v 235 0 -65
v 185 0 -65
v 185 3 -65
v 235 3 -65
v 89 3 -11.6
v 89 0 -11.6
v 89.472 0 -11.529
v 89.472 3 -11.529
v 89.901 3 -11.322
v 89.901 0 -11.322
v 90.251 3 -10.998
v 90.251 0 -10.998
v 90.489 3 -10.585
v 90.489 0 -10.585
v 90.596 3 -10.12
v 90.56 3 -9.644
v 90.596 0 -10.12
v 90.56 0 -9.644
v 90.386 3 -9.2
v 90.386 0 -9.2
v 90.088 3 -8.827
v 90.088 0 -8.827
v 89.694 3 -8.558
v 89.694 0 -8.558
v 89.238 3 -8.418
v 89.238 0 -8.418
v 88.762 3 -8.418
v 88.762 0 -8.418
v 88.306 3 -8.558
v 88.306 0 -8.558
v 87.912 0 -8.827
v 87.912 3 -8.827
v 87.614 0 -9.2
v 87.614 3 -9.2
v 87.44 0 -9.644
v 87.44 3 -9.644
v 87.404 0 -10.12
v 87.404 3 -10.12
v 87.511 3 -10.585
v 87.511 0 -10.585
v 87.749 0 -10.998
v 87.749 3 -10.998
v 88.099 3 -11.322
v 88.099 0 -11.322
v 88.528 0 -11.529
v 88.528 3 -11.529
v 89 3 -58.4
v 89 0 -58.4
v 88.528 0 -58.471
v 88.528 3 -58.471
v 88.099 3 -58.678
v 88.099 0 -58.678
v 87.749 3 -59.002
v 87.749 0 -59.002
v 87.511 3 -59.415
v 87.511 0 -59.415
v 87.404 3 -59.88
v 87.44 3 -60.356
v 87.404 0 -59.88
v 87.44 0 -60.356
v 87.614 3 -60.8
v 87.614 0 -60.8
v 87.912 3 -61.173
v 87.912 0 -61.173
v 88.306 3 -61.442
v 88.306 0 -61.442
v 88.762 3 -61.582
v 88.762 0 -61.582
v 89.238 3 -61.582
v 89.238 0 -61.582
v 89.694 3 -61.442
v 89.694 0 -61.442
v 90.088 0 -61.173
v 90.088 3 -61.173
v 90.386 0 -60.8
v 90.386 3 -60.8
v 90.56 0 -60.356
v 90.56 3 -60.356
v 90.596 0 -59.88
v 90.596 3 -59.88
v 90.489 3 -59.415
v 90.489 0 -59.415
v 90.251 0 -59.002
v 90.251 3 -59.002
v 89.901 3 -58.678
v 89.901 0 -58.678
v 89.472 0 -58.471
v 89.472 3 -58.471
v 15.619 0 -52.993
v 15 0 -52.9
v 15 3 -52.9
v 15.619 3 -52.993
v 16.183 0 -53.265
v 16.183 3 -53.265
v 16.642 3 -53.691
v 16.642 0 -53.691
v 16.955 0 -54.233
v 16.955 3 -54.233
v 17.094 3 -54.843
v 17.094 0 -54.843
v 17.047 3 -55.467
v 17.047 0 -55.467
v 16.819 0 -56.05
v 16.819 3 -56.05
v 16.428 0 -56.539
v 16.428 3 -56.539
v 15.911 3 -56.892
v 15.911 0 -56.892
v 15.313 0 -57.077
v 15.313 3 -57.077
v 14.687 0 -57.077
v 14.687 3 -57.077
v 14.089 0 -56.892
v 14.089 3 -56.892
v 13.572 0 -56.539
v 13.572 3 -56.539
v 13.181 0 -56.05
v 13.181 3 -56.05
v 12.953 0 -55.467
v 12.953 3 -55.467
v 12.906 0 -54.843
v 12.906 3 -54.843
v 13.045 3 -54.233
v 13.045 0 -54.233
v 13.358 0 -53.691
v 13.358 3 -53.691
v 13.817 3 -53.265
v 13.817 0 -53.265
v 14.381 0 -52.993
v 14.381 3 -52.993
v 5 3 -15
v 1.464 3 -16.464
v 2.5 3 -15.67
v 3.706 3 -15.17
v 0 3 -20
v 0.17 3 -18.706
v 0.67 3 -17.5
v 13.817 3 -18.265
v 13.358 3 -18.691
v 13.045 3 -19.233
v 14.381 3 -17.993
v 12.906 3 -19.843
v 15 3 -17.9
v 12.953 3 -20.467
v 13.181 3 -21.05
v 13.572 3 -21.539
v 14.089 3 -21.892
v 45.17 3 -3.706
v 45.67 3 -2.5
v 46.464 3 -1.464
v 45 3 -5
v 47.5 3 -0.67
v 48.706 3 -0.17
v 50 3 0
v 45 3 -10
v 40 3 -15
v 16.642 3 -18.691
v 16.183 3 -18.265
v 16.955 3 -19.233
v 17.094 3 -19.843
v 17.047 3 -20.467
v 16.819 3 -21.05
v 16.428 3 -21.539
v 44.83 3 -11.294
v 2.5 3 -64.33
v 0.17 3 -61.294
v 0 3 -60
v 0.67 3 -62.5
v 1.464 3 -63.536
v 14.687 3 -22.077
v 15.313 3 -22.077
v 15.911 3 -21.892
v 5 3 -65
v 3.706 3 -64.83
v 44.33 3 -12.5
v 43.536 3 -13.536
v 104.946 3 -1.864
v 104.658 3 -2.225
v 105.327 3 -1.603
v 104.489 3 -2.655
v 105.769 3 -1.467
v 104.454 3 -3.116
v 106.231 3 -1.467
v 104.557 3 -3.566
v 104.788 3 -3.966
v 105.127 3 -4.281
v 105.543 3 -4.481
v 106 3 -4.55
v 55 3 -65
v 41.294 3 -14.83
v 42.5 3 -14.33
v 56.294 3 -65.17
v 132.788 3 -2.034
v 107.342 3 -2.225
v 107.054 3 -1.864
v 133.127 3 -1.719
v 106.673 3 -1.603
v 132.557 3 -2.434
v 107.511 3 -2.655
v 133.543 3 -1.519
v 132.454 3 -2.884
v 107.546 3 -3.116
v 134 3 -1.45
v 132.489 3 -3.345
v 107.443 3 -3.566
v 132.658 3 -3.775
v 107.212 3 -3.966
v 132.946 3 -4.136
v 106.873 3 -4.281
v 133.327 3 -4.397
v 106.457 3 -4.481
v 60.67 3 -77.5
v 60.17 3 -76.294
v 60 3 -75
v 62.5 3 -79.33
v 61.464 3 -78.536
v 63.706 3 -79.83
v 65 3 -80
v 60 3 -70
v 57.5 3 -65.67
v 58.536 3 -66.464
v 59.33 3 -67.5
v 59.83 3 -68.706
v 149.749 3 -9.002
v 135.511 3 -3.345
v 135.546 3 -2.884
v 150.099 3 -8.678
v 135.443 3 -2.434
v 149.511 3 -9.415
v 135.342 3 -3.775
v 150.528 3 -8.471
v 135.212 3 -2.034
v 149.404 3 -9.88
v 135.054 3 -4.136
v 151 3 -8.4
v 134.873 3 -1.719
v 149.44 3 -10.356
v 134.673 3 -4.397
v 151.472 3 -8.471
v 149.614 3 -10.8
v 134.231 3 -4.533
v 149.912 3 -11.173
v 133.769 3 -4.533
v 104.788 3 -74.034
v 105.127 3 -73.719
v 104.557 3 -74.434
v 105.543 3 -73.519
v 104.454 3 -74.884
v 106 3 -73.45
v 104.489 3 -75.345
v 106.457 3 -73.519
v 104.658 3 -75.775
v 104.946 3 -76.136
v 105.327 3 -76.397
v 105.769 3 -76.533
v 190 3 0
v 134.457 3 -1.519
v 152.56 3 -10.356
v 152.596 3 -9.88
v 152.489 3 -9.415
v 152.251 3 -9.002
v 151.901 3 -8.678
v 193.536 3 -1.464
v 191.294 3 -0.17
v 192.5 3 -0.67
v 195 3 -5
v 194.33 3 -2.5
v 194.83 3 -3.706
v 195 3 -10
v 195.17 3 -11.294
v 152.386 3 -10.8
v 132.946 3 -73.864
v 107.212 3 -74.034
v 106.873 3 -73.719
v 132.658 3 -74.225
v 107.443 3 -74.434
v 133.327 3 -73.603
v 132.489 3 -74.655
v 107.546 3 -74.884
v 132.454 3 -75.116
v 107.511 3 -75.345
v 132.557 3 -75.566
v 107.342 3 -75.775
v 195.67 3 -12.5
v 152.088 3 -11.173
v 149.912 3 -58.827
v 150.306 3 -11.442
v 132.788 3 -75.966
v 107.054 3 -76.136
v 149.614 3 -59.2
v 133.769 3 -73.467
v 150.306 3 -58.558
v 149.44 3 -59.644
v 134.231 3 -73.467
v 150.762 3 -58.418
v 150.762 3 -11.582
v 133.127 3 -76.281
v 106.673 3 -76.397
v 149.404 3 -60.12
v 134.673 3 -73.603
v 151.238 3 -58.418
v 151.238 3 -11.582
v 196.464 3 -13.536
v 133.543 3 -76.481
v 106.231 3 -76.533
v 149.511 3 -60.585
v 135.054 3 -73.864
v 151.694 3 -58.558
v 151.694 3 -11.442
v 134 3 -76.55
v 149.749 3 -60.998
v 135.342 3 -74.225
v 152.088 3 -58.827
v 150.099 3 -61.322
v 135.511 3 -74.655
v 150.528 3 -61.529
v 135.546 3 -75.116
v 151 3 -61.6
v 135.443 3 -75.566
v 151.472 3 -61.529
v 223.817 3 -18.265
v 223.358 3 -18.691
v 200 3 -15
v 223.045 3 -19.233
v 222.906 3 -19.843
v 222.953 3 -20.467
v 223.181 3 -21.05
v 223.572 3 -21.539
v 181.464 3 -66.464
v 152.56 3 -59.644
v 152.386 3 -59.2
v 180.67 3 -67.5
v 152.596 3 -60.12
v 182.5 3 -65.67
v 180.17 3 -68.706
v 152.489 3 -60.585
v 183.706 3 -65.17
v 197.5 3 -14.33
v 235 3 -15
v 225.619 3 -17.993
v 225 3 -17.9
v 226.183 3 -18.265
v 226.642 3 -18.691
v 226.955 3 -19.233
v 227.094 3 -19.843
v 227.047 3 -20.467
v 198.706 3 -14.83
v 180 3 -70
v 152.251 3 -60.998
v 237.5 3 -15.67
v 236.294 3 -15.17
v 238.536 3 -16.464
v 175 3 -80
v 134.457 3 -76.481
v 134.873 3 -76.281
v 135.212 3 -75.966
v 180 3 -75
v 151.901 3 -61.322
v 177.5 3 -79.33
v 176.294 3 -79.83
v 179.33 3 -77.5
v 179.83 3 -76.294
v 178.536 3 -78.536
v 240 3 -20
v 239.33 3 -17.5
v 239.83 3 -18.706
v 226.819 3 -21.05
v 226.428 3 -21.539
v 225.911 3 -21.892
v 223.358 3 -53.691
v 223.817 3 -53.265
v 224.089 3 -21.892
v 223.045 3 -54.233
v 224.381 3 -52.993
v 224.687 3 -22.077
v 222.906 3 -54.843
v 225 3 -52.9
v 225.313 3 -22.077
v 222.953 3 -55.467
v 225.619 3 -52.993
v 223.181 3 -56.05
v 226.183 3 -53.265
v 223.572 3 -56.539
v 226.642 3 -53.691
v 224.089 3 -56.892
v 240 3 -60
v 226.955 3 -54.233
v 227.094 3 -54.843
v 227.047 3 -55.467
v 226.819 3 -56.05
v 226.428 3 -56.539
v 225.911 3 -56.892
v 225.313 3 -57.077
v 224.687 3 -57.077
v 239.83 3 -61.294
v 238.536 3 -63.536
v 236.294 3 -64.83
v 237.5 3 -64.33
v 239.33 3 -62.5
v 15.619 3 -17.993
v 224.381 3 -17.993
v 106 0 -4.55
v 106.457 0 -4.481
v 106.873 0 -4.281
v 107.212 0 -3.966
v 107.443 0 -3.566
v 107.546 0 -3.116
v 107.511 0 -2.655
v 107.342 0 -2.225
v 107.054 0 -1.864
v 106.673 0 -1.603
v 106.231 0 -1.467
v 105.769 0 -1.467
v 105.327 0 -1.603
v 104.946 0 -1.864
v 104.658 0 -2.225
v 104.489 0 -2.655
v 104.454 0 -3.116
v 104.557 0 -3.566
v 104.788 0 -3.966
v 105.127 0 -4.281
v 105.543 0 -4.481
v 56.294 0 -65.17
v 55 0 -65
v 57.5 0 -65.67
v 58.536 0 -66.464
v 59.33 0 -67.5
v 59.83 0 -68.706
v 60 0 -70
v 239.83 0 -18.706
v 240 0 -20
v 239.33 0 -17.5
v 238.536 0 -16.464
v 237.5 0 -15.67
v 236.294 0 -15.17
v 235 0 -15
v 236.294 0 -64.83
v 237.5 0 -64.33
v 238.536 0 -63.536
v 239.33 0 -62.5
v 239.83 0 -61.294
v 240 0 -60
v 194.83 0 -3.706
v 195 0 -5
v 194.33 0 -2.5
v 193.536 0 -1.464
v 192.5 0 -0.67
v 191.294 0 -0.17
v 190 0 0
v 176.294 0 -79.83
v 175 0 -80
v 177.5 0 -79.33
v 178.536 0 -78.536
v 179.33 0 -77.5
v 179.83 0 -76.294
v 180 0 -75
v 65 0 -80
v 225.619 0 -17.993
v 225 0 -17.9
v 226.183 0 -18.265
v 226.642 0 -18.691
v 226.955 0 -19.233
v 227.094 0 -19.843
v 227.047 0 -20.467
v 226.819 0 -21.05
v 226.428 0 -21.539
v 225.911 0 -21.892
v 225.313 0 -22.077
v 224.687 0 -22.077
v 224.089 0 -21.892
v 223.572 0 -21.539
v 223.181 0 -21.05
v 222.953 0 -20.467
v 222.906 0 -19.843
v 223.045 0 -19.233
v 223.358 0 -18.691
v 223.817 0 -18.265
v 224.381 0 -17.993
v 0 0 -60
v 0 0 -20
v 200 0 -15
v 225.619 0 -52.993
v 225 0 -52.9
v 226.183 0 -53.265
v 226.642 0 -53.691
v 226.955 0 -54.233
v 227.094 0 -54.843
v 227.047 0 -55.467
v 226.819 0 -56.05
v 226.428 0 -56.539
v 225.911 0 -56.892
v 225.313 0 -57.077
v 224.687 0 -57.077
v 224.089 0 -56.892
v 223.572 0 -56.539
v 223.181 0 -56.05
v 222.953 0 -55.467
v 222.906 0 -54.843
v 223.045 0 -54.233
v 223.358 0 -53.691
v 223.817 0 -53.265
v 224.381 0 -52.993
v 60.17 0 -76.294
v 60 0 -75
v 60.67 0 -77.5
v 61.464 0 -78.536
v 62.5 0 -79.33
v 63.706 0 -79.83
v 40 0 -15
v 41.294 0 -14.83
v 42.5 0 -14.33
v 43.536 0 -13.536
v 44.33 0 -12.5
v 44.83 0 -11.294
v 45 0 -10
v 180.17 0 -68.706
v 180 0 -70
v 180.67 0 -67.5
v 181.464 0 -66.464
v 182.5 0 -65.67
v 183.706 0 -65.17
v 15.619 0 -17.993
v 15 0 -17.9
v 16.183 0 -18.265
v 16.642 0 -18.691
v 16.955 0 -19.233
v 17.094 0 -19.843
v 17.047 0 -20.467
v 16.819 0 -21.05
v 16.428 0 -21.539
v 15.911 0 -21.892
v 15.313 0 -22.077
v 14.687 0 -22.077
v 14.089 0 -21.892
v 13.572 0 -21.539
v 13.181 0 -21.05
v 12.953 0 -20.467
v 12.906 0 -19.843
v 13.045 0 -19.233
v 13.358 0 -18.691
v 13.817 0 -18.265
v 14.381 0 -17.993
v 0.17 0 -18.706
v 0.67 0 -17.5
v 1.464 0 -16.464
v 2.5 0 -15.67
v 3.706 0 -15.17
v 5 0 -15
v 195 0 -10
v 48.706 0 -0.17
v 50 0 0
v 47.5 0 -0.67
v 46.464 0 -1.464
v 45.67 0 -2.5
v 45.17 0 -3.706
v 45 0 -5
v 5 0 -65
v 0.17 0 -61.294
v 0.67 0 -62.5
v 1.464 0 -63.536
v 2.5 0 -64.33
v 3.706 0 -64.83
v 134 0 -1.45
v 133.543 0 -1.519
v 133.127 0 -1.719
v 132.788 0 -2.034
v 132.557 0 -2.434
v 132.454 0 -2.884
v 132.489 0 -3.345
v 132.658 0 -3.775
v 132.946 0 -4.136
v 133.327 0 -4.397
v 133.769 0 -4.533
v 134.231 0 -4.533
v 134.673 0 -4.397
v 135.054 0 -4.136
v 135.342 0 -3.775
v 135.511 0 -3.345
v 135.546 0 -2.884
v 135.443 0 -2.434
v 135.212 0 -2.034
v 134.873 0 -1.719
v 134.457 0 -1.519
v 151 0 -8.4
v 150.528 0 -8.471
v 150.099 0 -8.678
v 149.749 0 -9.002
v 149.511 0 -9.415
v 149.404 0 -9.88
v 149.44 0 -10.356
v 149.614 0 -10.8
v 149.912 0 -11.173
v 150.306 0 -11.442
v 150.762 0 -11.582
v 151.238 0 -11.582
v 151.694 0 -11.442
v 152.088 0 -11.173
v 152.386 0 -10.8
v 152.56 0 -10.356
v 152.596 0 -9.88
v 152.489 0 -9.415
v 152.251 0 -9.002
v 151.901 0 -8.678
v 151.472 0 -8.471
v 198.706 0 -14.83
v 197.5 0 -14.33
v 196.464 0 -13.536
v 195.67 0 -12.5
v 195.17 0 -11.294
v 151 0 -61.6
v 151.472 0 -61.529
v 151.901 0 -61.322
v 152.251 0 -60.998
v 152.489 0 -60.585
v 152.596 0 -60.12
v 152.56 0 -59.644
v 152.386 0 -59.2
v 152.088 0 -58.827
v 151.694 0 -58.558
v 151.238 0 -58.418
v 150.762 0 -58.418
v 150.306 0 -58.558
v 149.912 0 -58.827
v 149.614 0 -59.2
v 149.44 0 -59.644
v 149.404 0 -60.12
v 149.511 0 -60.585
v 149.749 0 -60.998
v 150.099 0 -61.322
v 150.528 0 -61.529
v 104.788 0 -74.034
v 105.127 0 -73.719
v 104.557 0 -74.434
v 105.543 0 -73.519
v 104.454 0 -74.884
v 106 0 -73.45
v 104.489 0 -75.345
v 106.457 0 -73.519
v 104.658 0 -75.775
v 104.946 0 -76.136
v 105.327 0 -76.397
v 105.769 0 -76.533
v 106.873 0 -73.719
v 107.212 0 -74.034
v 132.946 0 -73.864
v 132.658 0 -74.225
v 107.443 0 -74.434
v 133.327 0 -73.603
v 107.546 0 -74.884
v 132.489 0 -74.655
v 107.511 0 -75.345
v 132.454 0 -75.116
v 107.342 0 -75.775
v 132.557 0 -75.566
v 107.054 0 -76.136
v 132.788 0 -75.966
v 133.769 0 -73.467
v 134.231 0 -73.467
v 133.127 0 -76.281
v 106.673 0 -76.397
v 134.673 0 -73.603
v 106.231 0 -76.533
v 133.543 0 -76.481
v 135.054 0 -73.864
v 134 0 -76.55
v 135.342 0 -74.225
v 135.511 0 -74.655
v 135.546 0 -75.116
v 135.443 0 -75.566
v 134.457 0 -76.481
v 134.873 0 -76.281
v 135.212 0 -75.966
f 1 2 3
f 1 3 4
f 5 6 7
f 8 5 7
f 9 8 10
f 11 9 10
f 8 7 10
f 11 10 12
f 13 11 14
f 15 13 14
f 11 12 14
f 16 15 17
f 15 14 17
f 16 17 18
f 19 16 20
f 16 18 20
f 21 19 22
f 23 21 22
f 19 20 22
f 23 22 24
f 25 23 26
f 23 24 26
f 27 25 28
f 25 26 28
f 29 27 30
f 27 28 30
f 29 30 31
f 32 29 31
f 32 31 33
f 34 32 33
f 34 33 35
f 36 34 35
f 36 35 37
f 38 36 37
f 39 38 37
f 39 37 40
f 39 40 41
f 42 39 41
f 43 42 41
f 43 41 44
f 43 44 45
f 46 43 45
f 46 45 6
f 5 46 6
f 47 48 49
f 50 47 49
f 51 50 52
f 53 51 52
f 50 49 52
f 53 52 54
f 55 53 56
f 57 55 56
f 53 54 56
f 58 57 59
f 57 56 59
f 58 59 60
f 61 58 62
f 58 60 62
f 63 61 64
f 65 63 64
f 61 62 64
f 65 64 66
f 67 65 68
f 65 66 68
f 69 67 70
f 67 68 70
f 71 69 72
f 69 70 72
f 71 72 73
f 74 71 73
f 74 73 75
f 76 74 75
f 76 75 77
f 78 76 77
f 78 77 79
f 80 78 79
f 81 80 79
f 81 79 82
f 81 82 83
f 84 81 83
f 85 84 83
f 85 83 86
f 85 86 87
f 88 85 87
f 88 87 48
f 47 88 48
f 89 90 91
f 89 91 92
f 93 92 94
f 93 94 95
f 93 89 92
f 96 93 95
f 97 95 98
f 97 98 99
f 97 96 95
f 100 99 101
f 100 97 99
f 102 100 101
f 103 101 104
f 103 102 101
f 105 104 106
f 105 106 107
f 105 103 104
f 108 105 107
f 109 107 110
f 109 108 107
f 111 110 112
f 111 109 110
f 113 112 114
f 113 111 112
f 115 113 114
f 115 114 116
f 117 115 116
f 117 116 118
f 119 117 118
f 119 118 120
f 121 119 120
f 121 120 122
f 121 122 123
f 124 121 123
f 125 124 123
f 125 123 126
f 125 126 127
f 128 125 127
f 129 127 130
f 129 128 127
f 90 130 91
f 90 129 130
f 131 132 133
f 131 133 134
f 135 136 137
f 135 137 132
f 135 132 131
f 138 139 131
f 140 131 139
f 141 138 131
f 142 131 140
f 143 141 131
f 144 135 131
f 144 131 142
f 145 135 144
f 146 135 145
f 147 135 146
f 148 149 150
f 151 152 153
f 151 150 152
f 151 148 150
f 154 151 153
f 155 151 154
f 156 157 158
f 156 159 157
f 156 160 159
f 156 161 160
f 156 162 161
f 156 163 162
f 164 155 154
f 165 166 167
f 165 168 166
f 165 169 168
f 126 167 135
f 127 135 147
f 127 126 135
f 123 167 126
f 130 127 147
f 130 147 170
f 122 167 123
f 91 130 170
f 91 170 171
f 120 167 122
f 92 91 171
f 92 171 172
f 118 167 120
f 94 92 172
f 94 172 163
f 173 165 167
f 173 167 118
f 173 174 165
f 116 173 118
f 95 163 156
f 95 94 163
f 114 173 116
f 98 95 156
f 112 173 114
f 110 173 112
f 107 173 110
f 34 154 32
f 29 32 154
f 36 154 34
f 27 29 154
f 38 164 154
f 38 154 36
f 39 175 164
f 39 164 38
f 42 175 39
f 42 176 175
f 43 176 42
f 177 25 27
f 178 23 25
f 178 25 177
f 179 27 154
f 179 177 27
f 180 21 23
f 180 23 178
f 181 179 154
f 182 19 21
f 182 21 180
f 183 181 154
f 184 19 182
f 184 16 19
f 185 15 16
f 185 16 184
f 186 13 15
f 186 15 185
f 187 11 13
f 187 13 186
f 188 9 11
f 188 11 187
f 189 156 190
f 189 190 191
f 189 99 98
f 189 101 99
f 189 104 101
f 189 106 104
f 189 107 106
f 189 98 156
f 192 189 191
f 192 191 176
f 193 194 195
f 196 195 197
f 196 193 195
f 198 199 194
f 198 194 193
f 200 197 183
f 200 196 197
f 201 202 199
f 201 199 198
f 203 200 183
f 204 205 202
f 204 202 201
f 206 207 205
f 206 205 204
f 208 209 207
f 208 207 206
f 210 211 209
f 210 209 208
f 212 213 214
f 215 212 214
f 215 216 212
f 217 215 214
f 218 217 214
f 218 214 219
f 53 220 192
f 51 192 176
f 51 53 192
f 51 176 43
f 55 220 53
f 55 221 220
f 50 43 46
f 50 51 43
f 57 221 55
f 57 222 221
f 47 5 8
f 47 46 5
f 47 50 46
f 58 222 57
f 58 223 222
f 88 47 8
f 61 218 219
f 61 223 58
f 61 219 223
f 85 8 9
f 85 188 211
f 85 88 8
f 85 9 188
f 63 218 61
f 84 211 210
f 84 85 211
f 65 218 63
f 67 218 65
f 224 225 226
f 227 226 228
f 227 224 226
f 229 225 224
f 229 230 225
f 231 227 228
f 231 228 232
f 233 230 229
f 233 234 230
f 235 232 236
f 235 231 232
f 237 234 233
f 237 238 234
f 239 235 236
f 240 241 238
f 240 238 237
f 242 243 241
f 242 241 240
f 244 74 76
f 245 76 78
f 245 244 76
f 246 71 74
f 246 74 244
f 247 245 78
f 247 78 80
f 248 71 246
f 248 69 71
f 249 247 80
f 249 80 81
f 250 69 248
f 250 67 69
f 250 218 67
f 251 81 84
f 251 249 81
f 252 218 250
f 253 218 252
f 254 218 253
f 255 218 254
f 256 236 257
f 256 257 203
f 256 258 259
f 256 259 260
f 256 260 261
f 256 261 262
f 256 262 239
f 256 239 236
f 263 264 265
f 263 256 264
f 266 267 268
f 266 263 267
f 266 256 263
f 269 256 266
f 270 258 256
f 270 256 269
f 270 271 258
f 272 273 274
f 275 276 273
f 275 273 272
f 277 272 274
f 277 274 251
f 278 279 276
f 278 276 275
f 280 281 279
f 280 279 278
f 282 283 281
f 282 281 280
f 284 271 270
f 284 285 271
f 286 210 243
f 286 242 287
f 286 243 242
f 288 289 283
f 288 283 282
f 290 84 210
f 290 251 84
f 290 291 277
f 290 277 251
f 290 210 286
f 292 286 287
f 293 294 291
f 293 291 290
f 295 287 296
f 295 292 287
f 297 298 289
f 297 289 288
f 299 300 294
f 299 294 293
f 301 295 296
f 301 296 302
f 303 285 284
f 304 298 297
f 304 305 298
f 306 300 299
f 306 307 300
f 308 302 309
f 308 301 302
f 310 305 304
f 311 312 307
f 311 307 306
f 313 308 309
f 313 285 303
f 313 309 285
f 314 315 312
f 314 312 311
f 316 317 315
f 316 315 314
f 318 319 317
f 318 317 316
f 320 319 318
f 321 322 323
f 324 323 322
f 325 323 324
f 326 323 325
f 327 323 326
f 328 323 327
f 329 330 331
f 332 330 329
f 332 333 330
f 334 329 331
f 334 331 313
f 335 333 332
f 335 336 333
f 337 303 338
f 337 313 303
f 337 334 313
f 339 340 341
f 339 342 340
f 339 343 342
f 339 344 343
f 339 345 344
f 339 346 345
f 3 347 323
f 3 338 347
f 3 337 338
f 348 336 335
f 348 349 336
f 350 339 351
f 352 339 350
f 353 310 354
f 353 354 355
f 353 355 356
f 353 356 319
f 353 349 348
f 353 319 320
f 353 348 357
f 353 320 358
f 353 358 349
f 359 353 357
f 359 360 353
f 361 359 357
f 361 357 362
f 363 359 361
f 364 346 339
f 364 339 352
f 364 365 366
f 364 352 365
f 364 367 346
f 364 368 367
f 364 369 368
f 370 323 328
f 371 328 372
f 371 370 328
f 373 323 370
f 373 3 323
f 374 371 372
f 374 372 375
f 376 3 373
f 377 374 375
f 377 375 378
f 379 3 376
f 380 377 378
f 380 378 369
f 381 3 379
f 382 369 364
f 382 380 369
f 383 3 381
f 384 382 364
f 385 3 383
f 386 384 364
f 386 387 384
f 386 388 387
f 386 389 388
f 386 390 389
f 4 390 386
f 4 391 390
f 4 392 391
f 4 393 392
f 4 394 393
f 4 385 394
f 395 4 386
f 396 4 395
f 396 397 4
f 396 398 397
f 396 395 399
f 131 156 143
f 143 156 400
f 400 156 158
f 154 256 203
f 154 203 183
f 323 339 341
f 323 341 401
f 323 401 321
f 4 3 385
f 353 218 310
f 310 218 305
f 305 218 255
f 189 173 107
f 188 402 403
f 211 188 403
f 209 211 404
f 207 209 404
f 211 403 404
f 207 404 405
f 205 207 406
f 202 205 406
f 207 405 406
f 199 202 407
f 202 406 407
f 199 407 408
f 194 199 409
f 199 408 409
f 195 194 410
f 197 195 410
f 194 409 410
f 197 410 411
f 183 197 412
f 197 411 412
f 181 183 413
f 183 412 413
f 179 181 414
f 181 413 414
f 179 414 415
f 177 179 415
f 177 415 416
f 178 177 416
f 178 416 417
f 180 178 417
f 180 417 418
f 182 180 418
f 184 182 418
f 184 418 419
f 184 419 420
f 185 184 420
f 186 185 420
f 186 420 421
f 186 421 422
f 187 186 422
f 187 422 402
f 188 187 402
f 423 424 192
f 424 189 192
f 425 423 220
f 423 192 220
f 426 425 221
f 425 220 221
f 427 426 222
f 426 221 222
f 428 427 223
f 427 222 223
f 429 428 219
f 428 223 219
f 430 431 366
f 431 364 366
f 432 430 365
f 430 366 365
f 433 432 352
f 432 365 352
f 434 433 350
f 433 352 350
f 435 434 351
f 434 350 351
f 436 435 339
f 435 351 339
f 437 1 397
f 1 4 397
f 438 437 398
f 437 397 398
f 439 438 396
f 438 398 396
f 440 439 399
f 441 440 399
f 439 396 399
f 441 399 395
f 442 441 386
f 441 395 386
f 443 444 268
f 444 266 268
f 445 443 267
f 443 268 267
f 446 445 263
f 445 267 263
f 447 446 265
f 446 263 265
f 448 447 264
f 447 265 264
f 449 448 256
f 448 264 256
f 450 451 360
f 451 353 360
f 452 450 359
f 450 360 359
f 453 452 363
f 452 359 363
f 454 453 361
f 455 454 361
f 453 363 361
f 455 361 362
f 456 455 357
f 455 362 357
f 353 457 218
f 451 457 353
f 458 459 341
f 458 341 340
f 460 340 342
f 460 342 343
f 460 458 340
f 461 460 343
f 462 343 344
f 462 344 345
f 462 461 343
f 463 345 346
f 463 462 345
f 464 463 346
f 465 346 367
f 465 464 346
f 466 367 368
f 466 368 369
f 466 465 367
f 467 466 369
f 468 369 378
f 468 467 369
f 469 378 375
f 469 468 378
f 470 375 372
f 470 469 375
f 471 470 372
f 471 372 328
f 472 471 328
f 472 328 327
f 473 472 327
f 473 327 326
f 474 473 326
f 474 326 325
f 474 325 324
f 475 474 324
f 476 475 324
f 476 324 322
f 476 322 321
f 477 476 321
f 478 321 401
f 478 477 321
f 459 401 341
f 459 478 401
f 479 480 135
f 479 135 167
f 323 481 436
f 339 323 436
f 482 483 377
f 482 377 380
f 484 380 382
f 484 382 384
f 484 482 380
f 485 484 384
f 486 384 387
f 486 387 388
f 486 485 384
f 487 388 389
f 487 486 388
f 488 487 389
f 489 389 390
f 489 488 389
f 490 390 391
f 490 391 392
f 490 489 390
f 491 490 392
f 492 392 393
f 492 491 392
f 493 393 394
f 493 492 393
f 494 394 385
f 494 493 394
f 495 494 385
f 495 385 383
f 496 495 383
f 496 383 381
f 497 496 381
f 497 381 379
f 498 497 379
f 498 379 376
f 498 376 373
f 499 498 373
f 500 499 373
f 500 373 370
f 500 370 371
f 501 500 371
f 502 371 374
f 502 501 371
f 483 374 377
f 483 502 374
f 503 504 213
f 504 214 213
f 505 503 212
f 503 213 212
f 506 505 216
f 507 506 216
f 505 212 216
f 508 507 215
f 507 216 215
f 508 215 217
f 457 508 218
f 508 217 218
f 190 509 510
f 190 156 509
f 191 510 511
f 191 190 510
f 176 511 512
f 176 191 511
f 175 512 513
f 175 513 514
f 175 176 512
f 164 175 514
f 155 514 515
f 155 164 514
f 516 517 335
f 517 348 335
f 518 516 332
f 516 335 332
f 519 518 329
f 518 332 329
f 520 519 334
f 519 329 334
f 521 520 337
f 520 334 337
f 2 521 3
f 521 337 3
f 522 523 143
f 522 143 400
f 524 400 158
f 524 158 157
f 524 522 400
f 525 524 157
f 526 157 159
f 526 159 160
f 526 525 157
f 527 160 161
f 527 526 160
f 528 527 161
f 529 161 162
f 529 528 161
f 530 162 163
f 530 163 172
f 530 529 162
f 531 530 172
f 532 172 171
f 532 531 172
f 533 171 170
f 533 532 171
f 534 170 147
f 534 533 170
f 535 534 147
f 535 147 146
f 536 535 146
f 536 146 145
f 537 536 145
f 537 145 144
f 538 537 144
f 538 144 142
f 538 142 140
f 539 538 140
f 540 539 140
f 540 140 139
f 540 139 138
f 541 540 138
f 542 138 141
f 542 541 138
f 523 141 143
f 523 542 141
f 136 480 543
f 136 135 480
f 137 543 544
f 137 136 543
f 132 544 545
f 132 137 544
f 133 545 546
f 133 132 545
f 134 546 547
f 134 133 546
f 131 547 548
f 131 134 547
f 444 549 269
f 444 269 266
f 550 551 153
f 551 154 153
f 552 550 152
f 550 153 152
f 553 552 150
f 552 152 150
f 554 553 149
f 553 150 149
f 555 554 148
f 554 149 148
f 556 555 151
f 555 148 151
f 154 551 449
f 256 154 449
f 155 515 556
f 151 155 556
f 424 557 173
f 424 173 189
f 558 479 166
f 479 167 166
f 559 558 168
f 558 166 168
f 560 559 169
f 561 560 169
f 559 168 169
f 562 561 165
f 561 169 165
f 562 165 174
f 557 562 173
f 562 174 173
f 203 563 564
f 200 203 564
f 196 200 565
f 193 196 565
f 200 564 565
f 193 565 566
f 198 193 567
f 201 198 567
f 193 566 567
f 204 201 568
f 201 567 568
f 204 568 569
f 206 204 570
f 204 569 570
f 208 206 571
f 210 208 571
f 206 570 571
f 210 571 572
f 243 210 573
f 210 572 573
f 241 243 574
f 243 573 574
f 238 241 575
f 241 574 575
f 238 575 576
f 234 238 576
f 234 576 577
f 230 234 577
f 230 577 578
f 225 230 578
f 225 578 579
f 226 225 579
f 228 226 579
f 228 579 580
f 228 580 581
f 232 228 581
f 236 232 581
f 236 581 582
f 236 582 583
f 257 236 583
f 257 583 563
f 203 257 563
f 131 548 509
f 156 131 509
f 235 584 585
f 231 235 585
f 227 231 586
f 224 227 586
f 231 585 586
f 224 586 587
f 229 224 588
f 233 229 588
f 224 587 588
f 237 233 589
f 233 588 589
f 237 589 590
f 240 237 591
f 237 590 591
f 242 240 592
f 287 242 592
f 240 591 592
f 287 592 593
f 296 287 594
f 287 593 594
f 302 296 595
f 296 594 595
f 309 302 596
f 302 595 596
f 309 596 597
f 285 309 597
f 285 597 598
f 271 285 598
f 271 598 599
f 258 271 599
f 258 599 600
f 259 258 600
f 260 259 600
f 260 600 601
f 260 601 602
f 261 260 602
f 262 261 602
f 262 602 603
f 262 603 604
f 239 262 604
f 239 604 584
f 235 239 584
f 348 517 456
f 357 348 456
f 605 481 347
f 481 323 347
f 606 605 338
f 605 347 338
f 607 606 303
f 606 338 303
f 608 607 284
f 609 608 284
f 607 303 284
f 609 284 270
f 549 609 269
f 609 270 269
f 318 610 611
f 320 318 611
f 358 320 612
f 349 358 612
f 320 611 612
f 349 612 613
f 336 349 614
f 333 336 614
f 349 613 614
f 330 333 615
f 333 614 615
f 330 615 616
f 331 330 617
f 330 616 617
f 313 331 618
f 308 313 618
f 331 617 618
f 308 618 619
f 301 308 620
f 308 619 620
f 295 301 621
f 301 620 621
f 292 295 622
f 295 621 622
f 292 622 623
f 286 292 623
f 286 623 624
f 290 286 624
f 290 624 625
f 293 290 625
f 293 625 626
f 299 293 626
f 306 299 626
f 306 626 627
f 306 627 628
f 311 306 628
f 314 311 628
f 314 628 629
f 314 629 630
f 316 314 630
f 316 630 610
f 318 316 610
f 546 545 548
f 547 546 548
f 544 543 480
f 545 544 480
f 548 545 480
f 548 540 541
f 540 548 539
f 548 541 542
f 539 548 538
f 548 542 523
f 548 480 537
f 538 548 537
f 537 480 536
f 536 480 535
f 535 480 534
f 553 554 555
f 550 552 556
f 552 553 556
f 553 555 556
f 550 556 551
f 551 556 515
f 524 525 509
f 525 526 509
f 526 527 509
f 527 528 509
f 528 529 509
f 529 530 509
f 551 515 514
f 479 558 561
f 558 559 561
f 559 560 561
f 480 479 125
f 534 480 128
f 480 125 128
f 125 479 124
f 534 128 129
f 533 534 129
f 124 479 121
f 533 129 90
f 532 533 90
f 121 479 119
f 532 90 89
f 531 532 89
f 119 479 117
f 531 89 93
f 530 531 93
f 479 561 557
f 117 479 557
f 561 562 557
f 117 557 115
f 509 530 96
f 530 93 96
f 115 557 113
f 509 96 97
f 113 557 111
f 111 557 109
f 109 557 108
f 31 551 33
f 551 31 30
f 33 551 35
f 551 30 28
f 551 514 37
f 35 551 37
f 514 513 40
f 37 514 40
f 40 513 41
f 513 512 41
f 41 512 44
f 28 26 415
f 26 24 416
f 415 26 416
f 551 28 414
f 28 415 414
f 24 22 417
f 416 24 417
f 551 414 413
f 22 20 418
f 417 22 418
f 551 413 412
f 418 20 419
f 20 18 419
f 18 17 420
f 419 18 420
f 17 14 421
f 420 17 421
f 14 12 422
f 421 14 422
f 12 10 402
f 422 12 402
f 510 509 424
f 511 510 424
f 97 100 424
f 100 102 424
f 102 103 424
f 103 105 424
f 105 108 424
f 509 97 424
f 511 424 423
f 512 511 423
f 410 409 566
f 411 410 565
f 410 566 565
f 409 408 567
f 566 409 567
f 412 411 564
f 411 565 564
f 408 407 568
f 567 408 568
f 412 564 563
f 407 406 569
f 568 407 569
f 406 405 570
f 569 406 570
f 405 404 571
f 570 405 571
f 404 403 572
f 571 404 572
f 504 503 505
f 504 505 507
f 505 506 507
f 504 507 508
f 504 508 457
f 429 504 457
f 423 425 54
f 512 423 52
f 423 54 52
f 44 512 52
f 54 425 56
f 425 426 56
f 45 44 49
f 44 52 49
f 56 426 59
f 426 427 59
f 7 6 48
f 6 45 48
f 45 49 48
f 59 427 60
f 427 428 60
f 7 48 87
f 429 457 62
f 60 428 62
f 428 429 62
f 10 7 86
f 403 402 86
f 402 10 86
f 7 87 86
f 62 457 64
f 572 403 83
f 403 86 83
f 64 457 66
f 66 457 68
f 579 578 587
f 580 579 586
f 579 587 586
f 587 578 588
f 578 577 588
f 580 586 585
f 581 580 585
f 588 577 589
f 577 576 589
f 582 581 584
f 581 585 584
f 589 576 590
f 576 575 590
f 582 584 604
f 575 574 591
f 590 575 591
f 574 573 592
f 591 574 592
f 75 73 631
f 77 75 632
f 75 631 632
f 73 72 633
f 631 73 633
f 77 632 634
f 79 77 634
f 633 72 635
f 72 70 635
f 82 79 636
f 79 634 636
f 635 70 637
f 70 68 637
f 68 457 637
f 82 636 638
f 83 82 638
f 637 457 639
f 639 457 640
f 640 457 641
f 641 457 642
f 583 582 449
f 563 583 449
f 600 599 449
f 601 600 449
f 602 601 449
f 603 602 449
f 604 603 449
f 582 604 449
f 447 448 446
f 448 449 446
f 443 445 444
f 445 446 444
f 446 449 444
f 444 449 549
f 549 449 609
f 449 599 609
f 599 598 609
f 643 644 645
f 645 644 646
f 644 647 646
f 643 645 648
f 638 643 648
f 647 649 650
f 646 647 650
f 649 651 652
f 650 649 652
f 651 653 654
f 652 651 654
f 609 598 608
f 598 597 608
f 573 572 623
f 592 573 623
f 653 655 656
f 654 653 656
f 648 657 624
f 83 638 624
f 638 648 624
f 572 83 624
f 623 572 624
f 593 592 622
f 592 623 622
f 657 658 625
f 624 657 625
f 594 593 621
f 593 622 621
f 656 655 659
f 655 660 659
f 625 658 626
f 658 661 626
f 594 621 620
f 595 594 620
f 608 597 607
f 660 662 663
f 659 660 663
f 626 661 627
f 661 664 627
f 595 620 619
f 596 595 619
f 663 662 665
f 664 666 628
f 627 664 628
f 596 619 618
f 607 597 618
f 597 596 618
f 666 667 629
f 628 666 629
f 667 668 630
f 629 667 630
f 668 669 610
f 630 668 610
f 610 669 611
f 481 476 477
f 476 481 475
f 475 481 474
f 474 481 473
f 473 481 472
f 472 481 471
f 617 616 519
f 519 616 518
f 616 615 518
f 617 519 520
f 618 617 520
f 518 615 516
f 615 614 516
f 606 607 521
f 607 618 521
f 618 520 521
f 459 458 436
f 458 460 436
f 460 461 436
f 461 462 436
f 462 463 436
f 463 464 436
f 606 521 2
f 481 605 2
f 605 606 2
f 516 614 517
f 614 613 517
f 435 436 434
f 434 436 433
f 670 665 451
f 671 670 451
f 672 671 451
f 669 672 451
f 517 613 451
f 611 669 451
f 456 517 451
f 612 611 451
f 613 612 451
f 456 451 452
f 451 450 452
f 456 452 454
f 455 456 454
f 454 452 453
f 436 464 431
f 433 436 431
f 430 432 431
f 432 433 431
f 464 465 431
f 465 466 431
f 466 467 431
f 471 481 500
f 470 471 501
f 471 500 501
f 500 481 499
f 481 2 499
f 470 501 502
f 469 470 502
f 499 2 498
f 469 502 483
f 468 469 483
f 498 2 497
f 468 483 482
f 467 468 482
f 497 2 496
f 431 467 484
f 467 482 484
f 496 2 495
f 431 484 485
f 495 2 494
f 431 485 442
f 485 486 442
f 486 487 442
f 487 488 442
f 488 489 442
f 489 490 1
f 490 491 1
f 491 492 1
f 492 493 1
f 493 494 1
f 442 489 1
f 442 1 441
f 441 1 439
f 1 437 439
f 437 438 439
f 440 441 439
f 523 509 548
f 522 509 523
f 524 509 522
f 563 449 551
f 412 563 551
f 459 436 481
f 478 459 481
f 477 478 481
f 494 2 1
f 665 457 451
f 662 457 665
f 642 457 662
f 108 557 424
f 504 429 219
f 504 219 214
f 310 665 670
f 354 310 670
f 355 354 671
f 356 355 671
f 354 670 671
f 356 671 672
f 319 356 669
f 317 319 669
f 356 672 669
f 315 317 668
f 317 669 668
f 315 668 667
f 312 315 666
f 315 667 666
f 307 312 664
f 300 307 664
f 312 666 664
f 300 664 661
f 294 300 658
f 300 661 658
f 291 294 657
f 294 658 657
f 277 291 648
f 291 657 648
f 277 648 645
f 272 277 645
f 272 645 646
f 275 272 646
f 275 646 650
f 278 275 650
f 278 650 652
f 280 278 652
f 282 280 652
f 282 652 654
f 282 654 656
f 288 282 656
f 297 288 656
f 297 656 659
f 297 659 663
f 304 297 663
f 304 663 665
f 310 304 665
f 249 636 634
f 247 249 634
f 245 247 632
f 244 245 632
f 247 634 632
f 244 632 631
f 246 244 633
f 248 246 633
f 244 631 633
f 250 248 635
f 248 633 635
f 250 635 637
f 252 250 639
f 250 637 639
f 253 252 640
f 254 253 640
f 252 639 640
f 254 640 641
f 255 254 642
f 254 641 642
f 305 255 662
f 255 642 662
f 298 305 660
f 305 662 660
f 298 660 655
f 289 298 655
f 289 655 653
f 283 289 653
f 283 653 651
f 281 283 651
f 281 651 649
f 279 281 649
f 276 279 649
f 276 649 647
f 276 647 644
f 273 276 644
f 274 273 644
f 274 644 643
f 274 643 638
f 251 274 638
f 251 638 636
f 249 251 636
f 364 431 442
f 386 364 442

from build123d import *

# Parameters (mm, degrees)
SKETCH_1_W          = 240
SKETCH_1_H          = 65
SKETCH_1_R          = 2.1
SKETCH_1_W_2        = 120
SKETCH_1_H_2        = 15
EXTRUDE_1_DEPTH     = 3
SKETCH_3_R          = 1.6
SKETCH_3_R_2        = 1.55
SKETCH_3_W          = 45
SKETCH_3_H          = 15
CUT_EXTRUDE_2_DEPTH = 254
FILLET_1_R          = 5


with BuildPart() as part:
    # 草图1 → 凸台-拉伸1 (new body)
    # profile 1 of 2: a face of its own
    with BuildSketch(Plane(origin=(0, 0, 0), x_dir=(1, 0, 0), z_dir=(0, 1, 0))):
        with Locations((120, 32.5)):
            Rectangle(SKETCH_1_W, SKETCH_1_H)
        with Locations(Location((225, 20, 0), (0, 0, 270))):
            Circle(SKETCH_1_R, mode=Mode.SUBTRACT)
        with Locations(Location((15, 55, 0), (0, 0, 270))):
            Circle(SKETCH_1_R, mode=Mode.SUBTRACT)
        with Locations(Location((15, 20, 0), (0, 0, 270))):
            Circle(SKETCH_1_R, mode=Mode.SUBTRACT)
        with Locations(Location((225, 55, 0), (0, 0, 270))):
            Circle(SKETCH_1_R, mode=Mode.SUBTRACT)
    # profile 2 of 2: a face of its own
    with BuildSketch(Plane(origin=(0, 0, 0), x_dir=(1, 0, 0), z_dir=(0, 1, 0))):
        with Locations((120, 72.5)):
            Rectangle(SKETCH_1_W_2, SKETCH_1_H_2)
    extrude(amount=EXTRUDE_1_DEPTH)

    # 草图3 → 切除-拉伸2 (cut, through all)
    with BuildSketch(Plane.XZ):
        with Locations(Location((89, -10, 0), (0, 0, 270))):
            Circle(SKETCH_3_R)
        with Locations(Location((151, -10, 0), (0, 0, 90))):
            Circle(SKETCH_3_R)
        with Locations(Location((151, -60, 0), (0, 0, 270))):
            Circle(SKETCH_3_R)
        with Locations(Location((89, -60, 0), (0, 0, 90))):
            Circle(SKETCH_3_R)
        with Locations(Location((106, -3, 0), (0, 0, 270))):
            Circle(SKETCH_3_R_2)
        with Locations(Location((134, -3, 0), (0, 0, 90))):
            Circle(SKETCH_3_R_2)
        with Locations(Location((134, -75, 0), (0, 0, 270))):
            Circle(SKETCH_3_R_2)
        with Locations(Location((106, -75, 0), (0, 0, 90))):
            Circle(SKETCH_3_R_2)
        with Locations((22.5, -7.5)):
            Rectangle(SKETCH_3_W, SKETCH_3_H)
        with Locations((217.5, -7.5)):
            Rectangle(SKETCH_3_W, SKETCH_3_H)
    extrude(amount=-CUT_EXTRUDE_2_DEPTH, mode=Mode.SUBTRACT)

    # 圆角1
    fillet_1_edges = [part.edges().sort_by_distance(p)[0] for p in [
        (0, 1.5, -65),
        (60, 1.5, -65),
        (60, 1.5, -80),
        (180, 1.5, -80),
        (180, 1.5, -65),
        (240, 1.5, -65),
        (45, 1.5, 0),
        (45, 1.5, -15),
        (0, 1.5, -15),
        (240, 1.5, -15),
        (195, 1.5, -15),
        (195, 1.5, 0),
    ]]
    fillet(fillet_1_edges, radius=FILLET_1_R)


solid = part.part
